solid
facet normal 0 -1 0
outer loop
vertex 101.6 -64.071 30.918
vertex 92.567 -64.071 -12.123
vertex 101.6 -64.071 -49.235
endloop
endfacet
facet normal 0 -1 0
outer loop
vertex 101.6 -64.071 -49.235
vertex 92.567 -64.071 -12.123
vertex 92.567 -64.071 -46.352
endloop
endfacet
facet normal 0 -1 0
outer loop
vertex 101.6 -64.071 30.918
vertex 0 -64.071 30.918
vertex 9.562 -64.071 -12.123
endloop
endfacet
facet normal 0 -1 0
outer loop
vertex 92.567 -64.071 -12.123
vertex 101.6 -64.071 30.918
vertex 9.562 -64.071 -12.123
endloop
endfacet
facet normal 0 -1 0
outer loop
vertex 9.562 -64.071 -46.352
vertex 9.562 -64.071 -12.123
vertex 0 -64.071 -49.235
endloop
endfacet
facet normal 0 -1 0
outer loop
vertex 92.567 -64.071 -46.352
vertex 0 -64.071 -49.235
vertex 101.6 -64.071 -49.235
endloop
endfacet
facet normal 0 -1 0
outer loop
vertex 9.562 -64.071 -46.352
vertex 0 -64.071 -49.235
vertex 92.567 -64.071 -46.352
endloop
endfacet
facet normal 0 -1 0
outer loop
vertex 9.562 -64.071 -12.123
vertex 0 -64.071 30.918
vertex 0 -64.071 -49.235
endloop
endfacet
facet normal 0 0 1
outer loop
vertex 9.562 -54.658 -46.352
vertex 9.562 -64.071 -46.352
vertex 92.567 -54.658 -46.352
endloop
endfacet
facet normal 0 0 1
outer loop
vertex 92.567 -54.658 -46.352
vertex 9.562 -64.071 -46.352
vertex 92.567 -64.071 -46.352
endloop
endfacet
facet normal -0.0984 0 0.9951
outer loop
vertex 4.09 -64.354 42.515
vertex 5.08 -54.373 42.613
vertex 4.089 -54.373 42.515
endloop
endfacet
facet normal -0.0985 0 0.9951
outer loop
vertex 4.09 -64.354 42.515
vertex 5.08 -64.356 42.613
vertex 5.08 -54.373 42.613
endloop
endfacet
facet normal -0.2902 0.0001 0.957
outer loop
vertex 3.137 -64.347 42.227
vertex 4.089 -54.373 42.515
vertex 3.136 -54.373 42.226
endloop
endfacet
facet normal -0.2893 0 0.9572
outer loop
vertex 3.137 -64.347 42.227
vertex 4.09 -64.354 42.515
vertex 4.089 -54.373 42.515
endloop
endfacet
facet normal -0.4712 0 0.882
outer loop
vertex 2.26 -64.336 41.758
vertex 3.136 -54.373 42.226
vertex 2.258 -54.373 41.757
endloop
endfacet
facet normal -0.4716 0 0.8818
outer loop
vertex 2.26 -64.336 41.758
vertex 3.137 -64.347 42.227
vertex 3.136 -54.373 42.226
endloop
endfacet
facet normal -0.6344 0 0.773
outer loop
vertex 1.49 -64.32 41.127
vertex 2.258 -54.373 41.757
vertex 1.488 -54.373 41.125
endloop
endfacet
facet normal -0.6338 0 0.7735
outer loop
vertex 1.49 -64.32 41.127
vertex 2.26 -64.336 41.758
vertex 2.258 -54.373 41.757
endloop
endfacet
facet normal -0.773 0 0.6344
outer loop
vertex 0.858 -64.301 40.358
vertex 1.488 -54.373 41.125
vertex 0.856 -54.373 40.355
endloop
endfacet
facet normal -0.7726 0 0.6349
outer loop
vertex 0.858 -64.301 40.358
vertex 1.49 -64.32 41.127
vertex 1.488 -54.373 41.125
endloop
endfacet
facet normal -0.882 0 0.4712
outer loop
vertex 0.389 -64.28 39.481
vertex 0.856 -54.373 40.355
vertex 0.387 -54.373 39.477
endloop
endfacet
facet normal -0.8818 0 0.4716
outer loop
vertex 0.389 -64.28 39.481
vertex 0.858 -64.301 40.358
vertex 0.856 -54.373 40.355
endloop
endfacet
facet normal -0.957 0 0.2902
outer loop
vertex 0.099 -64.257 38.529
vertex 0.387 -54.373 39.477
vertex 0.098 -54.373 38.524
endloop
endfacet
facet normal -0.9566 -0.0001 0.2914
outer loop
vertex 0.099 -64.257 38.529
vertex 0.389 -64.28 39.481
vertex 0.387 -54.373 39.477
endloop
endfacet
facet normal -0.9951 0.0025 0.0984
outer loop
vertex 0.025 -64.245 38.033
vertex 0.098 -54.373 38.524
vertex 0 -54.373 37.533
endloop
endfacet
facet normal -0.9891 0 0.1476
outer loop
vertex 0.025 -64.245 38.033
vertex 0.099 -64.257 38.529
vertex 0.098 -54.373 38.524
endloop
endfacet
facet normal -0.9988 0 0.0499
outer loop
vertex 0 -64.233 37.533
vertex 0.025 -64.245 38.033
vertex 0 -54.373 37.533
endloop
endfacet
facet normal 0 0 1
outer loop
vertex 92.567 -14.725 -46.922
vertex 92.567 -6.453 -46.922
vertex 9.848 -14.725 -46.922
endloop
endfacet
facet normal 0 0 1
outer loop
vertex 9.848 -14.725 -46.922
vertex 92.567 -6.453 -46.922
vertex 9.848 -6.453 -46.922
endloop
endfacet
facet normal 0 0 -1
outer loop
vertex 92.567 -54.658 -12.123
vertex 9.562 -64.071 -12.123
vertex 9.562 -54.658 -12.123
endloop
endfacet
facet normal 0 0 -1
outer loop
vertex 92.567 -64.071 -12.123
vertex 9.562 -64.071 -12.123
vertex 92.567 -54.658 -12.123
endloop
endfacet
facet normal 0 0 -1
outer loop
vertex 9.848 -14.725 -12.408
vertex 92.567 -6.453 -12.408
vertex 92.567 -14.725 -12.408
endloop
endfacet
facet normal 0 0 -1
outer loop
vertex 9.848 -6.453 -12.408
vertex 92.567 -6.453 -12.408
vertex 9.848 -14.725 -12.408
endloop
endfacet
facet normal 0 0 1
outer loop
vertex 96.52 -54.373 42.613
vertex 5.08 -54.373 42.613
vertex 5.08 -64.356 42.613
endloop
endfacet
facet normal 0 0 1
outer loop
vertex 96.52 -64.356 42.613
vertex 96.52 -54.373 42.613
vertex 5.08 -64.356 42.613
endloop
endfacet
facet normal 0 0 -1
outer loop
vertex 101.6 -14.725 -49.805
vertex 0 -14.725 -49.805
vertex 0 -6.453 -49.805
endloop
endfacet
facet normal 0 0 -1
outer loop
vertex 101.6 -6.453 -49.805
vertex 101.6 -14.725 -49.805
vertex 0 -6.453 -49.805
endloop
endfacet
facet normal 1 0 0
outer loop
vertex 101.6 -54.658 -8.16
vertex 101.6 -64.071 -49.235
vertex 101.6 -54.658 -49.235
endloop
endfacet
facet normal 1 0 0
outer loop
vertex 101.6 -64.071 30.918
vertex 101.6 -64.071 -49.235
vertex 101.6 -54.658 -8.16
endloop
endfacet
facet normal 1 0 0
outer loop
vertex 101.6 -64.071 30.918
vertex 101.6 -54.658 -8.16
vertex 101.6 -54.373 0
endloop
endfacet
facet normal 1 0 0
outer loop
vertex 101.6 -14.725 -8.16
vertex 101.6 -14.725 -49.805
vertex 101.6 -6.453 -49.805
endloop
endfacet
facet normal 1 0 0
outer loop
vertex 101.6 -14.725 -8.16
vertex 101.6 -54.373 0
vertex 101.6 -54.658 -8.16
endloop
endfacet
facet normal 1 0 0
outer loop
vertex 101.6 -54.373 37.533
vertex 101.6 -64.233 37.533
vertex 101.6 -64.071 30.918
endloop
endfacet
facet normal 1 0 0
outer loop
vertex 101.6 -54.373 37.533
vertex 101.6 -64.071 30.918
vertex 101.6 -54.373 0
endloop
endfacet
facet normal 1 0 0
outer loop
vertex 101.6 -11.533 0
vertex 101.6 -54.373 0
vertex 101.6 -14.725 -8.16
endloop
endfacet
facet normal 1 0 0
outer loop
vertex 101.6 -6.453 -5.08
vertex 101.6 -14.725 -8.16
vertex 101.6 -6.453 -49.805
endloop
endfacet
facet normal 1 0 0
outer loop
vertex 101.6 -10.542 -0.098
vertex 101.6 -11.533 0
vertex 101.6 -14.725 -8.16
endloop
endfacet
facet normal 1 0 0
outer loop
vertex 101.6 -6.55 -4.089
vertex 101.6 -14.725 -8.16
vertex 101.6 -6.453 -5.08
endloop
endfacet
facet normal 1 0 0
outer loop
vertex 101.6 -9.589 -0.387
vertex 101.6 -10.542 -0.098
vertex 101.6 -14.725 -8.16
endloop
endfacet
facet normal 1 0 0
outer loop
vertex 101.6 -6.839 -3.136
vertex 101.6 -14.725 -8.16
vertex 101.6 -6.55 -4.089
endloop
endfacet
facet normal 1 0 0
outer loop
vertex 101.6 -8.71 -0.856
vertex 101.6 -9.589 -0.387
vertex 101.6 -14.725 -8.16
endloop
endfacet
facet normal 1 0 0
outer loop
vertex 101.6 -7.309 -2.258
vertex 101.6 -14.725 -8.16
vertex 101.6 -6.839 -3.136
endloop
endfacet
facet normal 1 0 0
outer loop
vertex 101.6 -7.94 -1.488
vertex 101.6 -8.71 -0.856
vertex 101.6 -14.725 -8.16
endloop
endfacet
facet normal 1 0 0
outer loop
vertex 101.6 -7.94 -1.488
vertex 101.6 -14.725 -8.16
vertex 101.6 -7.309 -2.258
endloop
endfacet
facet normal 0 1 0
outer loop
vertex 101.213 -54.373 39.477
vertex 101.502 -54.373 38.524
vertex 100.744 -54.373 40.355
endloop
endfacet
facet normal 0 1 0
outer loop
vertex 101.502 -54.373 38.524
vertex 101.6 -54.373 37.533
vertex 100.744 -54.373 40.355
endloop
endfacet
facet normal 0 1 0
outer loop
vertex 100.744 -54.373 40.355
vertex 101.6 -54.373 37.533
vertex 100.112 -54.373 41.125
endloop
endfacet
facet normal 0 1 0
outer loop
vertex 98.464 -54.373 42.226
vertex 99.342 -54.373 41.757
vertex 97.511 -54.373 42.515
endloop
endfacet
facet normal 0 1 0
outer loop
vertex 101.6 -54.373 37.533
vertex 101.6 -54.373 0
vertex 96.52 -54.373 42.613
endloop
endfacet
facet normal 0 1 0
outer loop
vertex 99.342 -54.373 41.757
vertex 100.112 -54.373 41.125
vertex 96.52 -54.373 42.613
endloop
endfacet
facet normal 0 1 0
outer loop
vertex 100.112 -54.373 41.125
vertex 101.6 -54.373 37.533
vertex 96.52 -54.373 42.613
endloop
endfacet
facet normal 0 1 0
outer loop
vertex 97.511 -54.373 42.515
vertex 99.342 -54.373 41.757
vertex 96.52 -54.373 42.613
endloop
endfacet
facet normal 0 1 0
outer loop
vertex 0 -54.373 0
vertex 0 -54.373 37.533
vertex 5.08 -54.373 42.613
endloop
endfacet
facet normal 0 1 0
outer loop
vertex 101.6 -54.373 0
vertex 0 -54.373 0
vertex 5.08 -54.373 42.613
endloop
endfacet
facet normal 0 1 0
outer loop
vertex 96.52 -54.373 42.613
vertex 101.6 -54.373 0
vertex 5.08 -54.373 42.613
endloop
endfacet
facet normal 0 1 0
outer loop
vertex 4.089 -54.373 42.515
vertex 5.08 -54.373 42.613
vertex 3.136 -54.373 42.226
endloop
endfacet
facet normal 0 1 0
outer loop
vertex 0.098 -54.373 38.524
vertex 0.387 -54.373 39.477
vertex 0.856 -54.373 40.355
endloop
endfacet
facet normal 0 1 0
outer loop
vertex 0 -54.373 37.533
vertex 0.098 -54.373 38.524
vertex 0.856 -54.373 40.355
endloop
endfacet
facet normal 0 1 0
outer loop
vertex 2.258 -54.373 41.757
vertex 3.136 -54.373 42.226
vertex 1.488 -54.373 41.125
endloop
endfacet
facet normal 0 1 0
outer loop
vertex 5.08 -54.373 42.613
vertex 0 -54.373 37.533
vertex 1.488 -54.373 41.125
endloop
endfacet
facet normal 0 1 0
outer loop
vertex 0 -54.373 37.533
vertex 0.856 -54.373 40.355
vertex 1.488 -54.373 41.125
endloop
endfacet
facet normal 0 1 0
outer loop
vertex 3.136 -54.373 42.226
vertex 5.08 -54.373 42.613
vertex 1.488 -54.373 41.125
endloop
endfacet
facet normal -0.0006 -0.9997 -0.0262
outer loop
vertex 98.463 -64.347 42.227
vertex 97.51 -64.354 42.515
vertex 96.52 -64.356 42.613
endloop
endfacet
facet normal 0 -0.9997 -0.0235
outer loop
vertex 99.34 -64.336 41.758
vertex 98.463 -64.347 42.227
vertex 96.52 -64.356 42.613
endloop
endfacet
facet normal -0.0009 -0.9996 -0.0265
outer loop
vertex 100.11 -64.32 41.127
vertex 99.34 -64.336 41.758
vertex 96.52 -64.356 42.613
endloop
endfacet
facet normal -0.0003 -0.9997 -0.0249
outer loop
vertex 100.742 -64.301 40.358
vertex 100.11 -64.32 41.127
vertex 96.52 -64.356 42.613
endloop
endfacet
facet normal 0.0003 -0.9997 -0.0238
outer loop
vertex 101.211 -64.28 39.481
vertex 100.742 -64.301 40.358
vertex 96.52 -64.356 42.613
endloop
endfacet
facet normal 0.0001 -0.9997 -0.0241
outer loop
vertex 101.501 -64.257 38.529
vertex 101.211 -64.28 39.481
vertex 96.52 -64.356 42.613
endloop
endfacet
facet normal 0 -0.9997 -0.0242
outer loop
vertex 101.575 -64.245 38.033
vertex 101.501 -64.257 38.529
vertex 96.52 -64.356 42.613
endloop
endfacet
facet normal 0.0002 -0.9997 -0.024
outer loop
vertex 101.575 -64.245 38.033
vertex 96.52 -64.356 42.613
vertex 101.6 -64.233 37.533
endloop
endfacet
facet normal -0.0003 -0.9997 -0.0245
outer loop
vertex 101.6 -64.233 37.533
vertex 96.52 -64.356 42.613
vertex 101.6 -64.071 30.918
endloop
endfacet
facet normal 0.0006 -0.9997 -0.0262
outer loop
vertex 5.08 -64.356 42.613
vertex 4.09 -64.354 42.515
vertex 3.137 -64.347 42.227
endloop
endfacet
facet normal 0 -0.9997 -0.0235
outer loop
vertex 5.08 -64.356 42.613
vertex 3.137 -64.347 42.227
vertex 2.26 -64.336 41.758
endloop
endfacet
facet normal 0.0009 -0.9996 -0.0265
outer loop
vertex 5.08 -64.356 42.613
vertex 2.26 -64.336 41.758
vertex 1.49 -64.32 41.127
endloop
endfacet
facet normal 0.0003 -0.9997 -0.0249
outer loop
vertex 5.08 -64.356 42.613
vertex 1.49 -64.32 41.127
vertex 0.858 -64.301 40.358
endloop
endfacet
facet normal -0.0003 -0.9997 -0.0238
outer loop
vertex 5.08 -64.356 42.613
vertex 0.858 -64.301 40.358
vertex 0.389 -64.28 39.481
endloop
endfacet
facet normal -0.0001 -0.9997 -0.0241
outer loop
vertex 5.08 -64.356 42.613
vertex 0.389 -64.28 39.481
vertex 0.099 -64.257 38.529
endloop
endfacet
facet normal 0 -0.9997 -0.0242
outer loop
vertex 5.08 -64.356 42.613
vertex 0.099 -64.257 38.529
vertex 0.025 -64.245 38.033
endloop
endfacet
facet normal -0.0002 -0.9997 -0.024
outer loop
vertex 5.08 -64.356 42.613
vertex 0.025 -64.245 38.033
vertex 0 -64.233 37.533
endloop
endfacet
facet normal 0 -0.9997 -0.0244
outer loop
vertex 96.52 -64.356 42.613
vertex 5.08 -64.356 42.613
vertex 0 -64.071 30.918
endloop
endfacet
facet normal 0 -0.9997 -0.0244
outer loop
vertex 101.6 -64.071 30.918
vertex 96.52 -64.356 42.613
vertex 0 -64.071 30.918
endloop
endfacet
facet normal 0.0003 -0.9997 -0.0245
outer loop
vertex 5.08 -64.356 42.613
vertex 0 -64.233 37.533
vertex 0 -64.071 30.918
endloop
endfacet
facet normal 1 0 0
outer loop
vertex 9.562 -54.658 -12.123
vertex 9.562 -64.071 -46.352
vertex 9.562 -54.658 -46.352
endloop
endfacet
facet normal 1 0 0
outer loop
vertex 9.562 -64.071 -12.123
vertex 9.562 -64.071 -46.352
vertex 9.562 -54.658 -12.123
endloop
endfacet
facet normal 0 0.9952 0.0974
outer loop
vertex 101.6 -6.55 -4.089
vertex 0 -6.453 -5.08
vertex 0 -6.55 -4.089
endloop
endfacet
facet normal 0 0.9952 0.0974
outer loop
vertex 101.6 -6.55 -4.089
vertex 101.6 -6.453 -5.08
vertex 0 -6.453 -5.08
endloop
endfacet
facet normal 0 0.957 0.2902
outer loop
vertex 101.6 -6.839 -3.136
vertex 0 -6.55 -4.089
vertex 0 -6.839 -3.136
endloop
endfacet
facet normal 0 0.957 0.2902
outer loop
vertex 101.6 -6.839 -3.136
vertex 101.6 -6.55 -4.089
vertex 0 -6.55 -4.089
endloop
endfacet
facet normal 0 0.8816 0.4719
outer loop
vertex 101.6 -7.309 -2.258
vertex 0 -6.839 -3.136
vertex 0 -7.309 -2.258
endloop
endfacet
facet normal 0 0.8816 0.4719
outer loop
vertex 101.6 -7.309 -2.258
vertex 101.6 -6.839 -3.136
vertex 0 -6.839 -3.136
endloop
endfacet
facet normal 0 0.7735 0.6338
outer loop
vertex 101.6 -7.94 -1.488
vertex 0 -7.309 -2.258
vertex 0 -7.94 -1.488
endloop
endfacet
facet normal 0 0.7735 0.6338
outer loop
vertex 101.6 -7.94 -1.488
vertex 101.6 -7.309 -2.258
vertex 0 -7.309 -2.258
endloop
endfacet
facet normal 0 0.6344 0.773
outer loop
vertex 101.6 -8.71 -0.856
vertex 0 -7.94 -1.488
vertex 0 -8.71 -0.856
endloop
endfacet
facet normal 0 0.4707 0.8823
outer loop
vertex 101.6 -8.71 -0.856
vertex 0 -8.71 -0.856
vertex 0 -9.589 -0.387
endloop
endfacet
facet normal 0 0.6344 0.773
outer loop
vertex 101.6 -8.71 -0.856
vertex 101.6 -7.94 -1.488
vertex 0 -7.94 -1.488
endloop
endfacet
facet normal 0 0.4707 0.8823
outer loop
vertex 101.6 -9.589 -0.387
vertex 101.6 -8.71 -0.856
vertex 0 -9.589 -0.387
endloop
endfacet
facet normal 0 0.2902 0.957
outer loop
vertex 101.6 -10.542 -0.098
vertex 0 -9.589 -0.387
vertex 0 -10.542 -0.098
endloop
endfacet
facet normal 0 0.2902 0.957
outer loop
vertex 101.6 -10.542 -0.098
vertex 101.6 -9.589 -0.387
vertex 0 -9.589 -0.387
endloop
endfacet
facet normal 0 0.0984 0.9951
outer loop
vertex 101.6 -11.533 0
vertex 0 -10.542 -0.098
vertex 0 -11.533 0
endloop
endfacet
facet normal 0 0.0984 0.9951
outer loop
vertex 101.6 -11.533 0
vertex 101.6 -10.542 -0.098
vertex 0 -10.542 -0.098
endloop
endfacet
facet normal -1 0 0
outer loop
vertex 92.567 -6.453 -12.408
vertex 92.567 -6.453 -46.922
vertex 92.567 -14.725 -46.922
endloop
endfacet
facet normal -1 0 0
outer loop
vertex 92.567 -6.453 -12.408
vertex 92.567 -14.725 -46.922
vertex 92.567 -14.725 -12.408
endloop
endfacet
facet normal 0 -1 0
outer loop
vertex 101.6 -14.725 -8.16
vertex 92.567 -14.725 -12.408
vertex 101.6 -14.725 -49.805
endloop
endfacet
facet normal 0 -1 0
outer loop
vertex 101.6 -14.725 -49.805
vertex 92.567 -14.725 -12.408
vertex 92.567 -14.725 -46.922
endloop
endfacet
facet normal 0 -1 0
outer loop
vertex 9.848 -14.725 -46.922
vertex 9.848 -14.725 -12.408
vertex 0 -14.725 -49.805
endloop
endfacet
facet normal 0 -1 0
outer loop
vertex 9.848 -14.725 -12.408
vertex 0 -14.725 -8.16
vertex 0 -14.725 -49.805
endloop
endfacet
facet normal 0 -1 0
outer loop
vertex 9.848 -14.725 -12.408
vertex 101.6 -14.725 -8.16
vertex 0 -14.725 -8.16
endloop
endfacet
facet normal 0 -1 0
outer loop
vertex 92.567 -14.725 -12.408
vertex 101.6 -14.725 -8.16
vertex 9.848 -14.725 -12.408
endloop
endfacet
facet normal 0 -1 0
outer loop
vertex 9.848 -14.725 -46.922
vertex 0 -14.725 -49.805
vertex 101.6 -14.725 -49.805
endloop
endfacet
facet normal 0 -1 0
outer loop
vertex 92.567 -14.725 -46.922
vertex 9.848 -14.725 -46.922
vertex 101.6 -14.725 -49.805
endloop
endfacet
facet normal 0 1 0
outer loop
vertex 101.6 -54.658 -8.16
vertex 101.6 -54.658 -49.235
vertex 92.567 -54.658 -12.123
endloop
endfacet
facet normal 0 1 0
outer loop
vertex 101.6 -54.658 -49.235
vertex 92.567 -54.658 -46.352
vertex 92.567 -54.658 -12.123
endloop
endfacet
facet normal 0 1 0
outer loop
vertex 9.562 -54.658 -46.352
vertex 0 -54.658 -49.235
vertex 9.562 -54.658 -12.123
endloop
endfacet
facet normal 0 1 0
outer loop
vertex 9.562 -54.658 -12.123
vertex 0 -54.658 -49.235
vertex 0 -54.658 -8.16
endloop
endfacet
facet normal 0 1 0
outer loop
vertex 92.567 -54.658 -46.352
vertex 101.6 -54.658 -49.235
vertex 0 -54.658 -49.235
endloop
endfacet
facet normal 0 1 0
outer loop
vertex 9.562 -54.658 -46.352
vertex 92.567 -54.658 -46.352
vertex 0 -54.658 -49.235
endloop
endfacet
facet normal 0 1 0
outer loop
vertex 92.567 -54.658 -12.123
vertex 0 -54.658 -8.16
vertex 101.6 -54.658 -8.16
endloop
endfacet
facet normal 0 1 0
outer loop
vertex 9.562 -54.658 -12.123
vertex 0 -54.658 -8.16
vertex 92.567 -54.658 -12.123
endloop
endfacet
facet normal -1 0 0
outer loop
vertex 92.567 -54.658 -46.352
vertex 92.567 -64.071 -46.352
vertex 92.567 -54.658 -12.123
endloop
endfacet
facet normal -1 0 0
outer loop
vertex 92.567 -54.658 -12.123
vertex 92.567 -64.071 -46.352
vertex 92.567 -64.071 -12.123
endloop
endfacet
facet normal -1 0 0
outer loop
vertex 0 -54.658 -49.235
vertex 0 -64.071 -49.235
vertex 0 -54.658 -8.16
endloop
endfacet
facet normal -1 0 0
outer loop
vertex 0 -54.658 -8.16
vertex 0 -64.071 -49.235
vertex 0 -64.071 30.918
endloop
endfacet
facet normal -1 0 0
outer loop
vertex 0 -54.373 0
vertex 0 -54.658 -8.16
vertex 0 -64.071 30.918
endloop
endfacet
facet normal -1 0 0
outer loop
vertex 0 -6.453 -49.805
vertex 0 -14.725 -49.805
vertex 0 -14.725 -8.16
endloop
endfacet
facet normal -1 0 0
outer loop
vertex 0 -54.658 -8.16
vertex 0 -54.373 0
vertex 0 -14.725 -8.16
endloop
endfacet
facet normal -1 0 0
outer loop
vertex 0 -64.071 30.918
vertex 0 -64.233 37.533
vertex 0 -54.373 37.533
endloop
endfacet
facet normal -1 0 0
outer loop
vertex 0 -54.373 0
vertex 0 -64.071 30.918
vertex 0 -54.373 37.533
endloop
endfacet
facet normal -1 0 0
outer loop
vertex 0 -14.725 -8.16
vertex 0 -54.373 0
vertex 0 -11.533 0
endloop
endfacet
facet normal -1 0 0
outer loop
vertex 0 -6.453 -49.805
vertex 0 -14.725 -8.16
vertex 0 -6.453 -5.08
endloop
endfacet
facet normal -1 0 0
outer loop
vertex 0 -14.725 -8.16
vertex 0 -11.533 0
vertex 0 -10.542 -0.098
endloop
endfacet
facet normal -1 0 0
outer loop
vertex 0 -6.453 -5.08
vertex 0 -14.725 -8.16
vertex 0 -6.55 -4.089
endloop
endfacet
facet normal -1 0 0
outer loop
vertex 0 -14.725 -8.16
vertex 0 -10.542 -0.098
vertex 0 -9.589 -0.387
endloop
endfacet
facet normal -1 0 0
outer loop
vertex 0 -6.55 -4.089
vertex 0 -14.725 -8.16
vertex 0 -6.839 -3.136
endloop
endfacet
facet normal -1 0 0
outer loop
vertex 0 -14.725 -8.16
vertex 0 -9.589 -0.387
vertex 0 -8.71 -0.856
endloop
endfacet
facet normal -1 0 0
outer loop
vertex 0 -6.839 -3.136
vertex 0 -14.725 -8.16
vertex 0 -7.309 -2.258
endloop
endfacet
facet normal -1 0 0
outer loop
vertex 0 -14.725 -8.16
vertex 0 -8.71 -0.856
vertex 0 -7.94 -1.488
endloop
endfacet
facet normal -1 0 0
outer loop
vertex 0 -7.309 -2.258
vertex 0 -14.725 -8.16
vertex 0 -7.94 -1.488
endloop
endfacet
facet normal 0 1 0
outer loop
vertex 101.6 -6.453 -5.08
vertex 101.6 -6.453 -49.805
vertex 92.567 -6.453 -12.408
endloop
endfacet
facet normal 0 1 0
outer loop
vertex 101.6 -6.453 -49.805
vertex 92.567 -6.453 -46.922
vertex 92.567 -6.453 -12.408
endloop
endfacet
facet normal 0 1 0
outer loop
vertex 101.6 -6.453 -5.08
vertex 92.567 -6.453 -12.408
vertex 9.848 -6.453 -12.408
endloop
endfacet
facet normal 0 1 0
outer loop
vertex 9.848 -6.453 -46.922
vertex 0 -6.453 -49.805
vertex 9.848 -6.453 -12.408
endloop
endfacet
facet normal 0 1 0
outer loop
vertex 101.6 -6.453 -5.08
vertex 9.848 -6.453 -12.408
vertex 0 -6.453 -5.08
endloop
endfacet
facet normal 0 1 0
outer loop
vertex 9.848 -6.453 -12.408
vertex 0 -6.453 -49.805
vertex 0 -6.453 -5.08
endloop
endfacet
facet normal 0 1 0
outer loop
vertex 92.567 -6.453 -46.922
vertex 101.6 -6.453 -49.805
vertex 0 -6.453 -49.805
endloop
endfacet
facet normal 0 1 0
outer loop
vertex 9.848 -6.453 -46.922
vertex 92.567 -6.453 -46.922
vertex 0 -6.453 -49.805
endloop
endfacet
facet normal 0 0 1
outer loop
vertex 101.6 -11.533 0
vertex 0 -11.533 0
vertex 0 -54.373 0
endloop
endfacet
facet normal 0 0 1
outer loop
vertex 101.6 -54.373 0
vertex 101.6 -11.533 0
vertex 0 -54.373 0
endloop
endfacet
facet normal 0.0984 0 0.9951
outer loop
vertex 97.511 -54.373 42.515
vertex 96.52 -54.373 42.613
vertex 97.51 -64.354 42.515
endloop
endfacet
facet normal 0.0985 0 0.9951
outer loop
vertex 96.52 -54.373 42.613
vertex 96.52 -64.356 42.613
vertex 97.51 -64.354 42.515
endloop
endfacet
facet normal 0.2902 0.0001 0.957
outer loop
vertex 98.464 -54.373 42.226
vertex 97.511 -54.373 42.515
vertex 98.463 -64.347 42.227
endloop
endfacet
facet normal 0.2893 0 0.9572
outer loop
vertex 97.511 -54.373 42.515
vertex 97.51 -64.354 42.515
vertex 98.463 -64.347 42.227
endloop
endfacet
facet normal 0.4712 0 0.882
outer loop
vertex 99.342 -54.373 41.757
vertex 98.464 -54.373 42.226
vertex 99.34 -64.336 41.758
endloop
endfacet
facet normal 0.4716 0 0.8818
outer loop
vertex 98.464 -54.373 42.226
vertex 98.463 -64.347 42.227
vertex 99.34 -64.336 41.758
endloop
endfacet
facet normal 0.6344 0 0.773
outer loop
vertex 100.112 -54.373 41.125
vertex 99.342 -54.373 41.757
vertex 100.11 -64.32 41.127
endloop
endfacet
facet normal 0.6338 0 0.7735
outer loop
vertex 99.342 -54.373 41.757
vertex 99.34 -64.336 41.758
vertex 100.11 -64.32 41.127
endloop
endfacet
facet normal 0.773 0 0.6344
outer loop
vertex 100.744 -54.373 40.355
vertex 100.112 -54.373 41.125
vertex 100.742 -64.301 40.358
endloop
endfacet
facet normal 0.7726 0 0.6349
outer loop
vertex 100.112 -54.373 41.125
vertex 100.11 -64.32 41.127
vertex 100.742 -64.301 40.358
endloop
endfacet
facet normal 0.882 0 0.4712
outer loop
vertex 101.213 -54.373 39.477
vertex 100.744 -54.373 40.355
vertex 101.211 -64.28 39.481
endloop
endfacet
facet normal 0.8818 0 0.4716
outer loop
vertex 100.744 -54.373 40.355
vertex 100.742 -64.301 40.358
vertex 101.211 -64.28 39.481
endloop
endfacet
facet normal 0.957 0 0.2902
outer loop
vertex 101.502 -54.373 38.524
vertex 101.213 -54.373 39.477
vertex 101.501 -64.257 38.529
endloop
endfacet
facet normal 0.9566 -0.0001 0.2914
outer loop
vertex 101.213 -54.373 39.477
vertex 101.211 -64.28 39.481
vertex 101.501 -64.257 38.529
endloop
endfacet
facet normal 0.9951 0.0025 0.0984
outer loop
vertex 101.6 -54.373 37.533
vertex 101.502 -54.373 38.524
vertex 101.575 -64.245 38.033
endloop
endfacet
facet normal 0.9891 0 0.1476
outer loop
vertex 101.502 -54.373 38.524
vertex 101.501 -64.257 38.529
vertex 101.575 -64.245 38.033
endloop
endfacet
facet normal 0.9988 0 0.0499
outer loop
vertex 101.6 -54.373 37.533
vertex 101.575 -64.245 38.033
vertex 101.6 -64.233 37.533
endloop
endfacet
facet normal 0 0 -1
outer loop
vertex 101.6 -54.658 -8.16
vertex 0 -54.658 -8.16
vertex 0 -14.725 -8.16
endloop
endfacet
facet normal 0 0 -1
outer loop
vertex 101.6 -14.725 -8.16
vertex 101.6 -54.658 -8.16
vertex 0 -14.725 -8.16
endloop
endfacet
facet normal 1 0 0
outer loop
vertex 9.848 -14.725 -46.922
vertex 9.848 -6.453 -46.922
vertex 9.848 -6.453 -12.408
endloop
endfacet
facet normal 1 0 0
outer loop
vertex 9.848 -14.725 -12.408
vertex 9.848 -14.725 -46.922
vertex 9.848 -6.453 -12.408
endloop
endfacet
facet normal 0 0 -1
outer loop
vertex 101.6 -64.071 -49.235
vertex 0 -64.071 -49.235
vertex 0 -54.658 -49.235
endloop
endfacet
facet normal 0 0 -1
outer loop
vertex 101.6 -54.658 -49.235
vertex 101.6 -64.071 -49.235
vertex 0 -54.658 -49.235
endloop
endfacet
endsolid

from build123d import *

# Parameters (mm, degrees)
F1_DEPTH = 101.6
F2_R     = 5.08
F4_W     = 83.005025
F4_H     = 34.228876
F5_DEPTH = 25.4
F3_W     = 82.719785
F3_H     = 34.51412
F6_DEPTH = 25.4


with BuildPart() as f1:
    # F0 (on Right) → F1 (new body)
    with BuildSketch(Plane.YZ):
        Polygon((-64.356416, 42.612657), (-64.071178, 30.91779), (-64.071178, -49.234834), (-54.658234, -49.234834), (-54.658234, -8.160179), (-14.724543, -8.160179), (-14.724543, -49.805317), (-6.452564, -49.805317), (-6.452564, -7.589698), (-6.452564, 0), (-54.372992, 0), (-54.372992, 42.612657), align=None)
    extrude(amount=F1_DEPTH)

    # F2
    f2_edges = [f1.edges().sort_by_distance(p)[0] for p in [
        (101.6, -59.364704, 42.612657),
        (0, -59.364704, 42.612657),
        (50.8, -6.452564, 0),
    ]]
    fillet(f2_edges, radius=F2_R)

    # F4 (on face) → F5 (cut)
    with BuildSketch(Plane.XZ.offset(64.071178)):
        with Locations((51.064864, -29.237166)):
            Rectangle(F4_W, F4_H)
    extrude(amount=-F5_DEPTH, mode=Mode.SUBTRACT)

    # F3 (on face) → F6 (cut)
    with BuildSketch(Plane(origin=(0, -6.452564, 0), x_dir=(-1, 0, 0), z_dir=(0, 1, 0))):
        with Locations((-51.207484, -29.665028)):
            Rectangle(F3_W, F3_H)
    extrude(amount=-F6_DEPTH, mode=Mode.SUBTRACT)


solid = f1.part
